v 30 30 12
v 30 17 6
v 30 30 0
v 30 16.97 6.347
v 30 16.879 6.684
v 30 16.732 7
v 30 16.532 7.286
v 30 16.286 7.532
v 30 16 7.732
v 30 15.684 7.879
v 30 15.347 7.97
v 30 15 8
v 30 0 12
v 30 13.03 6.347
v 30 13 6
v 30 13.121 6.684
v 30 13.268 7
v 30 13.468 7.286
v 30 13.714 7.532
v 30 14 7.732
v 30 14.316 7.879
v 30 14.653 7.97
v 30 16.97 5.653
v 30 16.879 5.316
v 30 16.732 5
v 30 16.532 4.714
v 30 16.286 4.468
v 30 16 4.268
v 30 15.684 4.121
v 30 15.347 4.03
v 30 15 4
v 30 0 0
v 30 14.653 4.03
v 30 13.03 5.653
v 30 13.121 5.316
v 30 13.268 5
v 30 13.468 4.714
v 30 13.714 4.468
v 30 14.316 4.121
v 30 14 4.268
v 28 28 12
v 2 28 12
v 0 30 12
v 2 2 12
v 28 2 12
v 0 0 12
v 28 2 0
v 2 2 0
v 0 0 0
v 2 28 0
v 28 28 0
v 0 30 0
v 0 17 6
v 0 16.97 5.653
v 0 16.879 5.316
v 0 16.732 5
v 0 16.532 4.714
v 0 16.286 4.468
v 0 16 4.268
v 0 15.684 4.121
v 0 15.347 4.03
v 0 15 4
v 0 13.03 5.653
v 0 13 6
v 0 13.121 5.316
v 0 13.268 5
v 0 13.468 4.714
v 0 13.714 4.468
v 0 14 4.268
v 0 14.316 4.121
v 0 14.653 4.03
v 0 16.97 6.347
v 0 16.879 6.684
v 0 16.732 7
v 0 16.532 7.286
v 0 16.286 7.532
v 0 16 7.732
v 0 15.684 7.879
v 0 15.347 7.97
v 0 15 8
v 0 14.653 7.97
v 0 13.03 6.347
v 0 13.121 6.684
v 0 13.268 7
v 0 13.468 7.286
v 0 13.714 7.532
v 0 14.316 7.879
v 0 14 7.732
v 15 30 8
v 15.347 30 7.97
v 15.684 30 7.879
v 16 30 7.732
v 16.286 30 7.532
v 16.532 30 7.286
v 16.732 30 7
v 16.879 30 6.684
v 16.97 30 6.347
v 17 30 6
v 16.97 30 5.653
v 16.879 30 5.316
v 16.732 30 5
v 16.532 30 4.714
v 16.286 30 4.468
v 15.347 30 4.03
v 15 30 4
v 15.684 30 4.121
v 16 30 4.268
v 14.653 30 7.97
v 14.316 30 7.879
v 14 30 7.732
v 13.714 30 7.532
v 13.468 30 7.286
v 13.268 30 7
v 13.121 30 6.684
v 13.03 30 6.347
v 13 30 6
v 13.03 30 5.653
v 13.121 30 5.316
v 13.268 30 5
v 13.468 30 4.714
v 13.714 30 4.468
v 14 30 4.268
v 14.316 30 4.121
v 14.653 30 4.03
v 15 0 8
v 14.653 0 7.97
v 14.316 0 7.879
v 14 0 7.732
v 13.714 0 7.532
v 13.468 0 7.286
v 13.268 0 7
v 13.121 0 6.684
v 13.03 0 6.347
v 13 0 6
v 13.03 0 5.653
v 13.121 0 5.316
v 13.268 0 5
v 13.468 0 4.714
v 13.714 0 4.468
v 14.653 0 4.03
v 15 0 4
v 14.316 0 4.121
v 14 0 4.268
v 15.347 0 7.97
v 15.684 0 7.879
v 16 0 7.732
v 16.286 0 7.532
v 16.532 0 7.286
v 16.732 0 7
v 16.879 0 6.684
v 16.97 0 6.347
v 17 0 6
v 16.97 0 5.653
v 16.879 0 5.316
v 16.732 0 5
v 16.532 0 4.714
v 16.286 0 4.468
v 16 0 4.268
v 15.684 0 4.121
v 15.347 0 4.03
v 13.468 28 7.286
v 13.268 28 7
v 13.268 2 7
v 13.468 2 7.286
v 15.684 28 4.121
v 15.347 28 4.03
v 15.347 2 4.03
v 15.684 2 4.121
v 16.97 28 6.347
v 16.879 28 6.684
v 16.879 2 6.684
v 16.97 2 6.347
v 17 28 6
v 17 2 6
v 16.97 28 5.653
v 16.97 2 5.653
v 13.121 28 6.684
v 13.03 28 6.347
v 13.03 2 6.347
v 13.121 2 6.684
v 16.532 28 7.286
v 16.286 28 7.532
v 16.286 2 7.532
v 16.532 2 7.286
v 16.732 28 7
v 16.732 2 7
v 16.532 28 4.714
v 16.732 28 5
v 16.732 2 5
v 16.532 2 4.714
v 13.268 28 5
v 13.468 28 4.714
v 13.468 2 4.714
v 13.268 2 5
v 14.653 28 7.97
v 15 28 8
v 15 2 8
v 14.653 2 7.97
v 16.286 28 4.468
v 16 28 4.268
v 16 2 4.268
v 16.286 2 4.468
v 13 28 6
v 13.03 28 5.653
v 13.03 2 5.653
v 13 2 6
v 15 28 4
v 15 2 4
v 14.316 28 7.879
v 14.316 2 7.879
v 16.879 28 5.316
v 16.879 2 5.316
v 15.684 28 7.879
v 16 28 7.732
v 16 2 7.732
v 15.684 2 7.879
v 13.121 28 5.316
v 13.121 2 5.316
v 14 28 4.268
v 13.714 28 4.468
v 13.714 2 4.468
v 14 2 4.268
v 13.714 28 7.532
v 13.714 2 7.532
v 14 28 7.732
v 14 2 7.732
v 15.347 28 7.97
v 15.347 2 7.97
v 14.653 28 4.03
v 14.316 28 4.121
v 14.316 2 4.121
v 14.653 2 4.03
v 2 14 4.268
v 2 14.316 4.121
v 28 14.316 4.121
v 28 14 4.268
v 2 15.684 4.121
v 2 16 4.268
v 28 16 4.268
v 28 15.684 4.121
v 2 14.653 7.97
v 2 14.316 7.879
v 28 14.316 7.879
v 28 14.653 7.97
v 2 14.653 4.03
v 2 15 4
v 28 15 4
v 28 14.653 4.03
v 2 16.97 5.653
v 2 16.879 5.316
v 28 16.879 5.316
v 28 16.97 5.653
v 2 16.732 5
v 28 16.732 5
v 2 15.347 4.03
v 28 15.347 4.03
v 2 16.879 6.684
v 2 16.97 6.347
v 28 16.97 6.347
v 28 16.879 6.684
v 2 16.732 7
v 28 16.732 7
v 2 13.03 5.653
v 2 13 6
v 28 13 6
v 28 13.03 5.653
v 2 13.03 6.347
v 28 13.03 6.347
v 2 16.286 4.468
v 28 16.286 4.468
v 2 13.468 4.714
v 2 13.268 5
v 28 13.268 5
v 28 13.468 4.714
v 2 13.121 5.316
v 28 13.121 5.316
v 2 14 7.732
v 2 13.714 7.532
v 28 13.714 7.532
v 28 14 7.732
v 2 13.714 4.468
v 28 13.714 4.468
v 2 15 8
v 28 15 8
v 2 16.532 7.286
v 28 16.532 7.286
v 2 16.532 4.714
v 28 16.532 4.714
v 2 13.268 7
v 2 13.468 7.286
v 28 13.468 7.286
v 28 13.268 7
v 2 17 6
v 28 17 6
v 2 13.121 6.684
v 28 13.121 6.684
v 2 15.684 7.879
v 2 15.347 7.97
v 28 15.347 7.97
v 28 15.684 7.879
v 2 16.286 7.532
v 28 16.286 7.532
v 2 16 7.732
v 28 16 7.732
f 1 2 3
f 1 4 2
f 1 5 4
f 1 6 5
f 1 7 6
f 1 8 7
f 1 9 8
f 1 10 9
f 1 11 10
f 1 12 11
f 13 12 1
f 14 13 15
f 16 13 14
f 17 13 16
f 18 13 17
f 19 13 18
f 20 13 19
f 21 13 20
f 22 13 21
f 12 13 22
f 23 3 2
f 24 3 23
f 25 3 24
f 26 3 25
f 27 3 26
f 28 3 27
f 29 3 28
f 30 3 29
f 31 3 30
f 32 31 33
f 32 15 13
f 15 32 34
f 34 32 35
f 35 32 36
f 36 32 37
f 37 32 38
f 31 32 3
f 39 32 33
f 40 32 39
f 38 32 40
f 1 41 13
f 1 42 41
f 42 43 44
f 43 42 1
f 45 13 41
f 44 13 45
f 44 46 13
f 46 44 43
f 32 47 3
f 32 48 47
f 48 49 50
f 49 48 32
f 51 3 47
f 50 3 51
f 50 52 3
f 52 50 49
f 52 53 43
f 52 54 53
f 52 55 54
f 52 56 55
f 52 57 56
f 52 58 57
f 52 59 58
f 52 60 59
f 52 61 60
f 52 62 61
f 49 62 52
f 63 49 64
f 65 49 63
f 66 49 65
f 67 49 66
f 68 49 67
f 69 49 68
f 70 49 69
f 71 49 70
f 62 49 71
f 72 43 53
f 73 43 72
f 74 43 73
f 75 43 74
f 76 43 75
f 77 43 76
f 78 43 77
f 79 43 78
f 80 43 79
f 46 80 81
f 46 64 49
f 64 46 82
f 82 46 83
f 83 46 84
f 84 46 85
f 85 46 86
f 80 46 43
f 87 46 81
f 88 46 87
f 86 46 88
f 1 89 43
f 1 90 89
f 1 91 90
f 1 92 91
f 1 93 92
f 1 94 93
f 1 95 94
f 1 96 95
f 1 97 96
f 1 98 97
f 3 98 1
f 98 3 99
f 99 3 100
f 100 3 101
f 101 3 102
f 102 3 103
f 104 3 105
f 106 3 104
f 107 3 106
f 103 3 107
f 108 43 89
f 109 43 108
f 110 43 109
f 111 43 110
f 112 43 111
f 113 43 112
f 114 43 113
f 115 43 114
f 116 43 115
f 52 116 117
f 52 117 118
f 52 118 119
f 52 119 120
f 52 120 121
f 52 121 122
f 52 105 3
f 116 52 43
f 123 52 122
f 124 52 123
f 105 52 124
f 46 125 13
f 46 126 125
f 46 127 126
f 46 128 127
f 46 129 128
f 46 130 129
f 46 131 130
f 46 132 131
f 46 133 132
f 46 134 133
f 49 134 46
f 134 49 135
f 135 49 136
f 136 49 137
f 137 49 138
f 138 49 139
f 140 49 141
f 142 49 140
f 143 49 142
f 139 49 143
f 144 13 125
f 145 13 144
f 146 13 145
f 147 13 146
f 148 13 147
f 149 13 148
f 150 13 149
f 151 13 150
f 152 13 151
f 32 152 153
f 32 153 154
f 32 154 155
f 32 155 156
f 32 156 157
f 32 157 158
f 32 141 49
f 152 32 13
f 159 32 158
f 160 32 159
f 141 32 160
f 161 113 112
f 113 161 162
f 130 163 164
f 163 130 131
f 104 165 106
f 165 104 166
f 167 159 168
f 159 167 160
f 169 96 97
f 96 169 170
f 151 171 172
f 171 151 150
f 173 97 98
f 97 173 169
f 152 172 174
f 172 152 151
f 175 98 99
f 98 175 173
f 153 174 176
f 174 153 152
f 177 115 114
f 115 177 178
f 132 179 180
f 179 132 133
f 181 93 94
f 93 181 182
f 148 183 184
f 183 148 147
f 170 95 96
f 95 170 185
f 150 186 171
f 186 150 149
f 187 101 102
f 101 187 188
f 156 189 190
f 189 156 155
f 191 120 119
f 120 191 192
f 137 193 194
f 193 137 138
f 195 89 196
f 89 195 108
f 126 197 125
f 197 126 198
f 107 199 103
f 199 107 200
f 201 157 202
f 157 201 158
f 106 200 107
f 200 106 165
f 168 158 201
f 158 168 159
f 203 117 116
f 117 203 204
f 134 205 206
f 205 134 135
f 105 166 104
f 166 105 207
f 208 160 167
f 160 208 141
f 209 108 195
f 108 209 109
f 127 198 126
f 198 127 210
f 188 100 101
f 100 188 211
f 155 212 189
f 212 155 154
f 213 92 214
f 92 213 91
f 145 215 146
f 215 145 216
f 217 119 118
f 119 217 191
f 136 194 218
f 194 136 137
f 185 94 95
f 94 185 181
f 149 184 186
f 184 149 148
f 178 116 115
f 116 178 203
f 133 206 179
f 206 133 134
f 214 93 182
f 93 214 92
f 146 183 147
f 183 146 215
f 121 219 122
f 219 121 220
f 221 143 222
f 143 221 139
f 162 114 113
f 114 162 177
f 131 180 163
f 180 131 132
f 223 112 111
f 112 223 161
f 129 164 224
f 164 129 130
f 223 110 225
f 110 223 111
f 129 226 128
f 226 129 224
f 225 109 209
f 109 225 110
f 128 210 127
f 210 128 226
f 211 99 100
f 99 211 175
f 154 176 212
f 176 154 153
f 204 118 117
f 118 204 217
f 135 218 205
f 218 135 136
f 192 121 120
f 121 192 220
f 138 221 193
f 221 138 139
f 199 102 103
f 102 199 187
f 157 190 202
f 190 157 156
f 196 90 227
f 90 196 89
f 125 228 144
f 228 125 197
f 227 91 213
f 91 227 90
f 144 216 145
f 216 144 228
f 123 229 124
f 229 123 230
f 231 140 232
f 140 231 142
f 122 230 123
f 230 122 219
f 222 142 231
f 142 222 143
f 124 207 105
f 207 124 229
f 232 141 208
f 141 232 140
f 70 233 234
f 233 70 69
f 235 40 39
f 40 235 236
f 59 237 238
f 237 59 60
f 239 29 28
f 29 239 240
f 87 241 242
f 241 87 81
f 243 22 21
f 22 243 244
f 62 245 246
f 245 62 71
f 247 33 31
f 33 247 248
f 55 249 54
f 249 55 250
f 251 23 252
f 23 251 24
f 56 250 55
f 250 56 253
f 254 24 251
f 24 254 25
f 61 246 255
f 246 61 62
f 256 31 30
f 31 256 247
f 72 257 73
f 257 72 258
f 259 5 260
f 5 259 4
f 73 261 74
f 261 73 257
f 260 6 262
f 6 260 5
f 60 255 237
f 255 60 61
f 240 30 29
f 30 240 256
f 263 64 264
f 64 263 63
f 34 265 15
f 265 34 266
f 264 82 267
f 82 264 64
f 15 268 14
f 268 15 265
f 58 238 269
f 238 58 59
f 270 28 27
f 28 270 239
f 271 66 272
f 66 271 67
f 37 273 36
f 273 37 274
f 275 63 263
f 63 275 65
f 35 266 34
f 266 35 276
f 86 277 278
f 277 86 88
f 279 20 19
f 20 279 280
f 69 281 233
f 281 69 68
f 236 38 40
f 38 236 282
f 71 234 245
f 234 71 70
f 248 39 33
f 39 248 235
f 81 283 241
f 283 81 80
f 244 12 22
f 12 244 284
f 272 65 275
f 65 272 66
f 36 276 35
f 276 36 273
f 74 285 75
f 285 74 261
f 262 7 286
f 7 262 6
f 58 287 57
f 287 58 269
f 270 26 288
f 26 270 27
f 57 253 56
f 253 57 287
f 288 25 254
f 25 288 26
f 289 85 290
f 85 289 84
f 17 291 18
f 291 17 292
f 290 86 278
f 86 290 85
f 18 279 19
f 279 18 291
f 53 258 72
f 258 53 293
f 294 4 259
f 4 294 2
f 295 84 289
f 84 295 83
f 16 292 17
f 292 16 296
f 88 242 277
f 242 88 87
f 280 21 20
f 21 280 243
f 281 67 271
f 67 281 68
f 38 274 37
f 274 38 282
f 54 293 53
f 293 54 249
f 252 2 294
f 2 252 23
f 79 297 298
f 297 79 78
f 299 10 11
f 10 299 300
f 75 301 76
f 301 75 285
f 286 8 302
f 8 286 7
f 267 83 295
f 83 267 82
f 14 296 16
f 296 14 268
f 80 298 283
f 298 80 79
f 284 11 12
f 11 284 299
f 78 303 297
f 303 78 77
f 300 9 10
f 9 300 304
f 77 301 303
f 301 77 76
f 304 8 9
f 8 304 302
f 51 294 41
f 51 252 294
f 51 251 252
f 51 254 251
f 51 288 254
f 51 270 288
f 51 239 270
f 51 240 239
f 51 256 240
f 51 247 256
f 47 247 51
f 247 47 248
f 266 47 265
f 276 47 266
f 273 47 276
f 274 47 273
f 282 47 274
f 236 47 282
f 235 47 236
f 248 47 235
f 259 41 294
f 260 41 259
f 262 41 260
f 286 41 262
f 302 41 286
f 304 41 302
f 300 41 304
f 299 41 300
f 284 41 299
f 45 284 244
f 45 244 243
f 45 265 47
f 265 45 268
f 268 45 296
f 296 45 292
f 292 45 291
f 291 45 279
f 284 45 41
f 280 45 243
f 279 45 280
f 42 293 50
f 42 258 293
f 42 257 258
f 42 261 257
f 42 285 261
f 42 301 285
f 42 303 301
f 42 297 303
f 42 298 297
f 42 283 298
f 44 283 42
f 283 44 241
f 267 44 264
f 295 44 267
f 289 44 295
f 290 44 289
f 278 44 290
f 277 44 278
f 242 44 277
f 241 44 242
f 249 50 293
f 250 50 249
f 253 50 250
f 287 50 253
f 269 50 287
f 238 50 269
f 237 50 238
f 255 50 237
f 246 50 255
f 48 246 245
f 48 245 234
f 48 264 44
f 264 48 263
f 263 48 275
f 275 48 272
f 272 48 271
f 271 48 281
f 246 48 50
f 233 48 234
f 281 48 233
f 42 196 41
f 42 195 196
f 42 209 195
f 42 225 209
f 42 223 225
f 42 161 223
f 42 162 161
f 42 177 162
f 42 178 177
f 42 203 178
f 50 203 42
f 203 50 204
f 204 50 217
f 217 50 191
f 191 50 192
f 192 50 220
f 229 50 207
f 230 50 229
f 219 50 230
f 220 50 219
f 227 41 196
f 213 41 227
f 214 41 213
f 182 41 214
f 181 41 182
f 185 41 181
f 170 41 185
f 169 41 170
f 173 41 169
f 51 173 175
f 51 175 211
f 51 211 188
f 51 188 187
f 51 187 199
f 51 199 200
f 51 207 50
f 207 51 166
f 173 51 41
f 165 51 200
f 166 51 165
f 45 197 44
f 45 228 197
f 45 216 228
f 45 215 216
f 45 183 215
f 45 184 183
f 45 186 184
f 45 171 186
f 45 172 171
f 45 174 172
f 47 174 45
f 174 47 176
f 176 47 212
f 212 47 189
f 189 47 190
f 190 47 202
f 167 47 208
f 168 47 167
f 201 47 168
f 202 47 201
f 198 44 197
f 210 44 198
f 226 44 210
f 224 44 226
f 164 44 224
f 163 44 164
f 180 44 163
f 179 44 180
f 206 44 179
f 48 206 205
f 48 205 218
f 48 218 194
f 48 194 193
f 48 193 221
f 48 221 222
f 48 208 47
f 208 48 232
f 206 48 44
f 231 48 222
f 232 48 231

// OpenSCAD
// file: configuration.scad
// adjust to your needs.
$fn=36;
wall_thick=2;// how far holes are from an edge

//motor mount
body_x=96;//this needs to be 2xmotor size + or larger ~96 for outsid path, and ~85 for inside path
body_y=20;
body_z=17;

//nema motor dimensions 31,42.3, 3 are good for nema17
nema_mount=31;// spacing of the mount holes 31mm, 
nema_body=42.3;//width of the motor body
nema_bolt=3;//mountbolt dia
//dimensions of the hob
hob_offy=10;//distance from the motors flat to the mk8 gear
hob_d1=-7;//diameter of the filament path a -number places the path  on the outside of the motors, a positive one on the inside 
inside=0;//1 to have the filament path on the center side of the motors

//hotend
hotend_dia=16.3;
groove=12.2;
groovez=4.6;
ptfe=4.2;//tube dia


nut=8.8;//hex nut size
mount_bolt=4;
mount_bolthead=15;
// bearing dimesnsions
bearing_l=30;
bearing_h=21;
smoothrod=12;

motorgap=(1);
xspace=45;
// main file
include <configuration.scad>;
cable_holder();
module cable_holder(){
//cable loop
l=30;
w=30;
h=12;
thick=wall_thick;//wall thickness
bolt=mount_bolt;//size of the boltholes
difference (){
   cube([l,w,h]);
    translate ([l/2,w/2,h/2])
    rotate ([90,0,0])
    cylinder (d=bolt, h=w+1, center = true);
    translate ([l/2,w/2,h/2])
    rotate ([0,90,0])
    cylinder (d=bolt, h=w+1, center = true);
    translate([thick,thick,-.1])
    cube (l-thick*2, w-thick*2, h+.2);
    }
}
